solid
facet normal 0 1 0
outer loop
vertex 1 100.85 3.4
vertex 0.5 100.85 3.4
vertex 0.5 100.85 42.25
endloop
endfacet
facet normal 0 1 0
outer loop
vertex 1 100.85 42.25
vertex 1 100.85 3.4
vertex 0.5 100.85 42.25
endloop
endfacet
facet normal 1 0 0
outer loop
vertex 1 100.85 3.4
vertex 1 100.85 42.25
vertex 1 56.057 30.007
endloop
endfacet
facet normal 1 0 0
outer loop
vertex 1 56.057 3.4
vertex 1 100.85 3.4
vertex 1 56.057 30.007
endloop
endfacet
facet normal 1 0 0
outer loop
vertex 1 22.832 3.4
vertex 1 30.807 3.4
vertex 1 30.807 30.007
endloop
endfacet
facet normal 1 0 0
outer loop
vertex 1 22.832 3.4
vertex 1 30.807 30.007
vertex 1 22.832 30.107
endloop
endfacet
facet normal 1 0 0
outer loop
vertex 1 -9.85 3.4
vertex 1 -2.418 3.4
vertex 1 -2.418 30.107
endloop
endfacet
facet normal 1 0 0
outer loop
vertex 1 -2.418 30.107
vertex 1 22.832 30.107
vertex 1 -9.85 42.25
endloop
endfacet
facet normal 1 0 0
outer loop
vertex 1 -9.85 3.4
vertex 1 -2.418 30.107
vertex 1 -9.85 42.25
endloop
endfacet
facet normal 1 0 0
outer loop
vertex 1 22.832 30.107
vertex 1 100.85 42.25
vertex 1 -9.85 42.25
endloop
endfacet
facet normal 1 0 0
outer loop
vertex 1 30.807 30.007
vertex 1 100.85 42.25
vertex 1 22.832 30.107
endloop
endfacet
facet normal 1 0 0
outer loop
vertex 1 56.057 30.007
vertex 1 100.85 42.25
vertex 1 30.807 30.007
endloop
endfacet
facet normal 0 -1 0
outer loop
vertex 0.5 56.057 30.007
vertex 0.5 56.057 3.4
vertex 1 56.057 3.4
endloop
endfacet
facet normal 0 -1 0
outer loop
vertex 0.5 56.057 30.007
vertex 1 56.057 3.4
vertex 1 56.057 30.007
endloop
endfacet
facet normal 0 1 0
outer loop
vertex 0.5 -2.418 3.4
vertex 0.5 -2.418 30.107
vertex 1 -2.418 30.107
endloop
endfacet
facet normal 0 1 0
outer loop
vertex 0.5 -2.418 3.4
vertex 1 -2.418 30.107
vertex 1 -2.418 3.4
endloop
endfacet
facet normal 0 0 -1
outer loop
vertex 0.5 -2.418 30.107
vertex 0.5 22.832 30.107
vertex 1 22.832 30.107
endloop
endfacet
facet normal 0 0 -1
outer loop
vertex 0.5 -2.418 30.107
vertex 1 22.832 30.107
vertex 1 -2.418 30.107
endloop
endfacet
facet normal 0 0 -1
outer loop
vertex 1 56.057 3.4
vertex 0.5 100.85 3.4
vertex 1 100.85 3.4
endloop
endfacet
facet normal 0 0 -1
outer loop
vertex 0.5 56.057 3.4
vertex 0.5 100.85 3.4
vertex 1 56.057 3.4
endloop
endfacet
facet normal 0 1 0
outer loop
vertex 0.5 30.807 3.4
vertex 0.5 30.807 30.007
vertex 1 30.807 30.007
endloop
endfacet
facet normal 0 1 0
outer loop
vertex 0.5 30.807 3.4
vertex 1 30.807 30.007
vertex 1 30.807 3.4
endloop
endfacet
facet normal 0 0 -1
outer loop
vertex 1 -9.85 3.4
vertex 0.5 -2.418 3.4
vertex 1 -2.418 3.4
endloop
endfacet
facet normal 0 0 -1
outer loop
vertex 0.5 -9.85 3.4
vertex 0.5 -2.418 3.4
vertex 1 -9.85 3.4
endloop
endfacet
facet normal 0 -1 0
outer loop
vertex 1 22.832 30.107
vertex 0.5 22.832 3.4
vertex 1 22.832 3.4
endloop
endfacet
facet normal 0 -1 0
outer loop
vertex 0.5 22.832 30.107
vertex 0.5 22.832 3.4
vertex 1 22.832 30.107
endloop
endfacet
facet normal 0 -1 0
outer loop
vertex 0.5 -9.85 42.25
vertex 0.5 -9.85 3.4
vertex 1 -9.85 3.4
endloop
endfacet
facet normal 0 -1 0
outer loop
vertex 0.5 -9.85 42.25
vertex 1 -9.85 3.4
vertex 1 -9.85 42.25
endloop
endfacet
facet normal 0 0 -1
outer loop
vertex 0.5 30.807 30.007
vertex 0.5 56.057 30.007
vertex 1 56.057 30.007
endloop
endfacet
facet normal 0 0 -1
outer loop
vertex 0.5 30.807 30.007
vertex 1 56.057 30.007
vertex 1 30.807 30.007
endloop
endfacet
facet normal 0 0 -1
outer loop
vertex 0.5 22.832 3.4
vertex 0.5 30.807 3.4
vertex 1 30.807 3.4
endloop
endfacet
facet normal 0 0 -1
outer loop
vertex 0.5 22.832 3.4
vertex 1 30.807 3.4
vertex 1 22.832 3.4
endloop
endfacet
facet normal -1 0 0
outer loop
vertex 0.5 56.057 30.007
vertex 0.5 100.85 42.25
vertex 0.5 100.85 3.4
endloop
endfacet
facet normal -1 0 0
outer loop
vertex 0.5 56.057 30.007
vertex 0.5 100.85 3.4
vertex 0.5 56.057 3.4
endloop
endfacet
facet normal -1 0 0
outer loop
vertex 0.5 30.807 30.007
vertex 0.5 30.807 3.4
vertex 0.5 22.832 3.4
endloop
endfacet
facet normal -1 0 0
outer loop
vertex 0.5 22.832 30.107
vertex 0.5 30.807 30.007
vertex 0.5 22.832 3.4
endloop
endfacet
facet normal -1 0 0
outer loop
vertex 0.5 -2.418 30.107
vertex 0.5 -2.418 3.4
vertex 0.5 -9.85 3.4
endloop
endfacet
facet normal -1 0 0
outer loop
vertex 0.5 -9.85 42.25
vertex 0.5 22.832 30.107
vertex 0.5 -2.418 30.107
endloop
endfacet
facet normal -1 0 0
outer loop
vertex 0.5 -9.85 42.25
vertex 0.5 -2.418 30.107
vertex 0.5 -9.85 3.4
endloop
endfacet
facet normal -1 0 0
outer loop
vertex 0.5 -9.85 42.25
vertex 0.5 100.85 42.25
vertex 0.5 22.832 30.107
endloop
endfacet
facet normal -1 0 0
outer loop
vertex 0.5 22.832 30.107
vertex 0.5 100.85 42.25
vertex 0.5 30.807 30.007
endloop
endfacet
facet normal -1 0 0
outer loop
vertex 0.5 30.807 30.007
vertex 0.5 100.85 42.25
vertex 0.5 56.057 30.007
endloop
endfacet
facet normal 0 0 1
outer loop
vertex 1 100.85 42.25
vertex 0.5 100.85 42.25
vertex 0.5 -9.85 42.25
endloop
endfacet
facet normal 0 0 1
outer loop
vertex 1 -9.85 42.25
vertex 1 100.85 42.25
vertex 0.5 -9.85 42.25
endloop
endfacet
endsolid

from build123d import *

# Parameters (mm, degrees)
SKETCH_1_W          = 110.7
SKETCH_1_H          = 38.85
EXTRUDE_1_DEPTH     = 0.5
CUT_EXTRUDE_1_DEPTH = 110.343655509


with BuildPart() as part:
    # Эскиз1 → Бобышка-Вытянуть1 (new body)
    with BuildSketch(Plane(origin=(0.5, 0, 0), x_dir=(0, -1, 0), z_dir=(-1, 0, 0))):
        with Locations((-45.5, 22.825)):
            Rectangle(SKETCH_1_W, SKETCH_1_H)
    extrude(amount=-EXTRUDE_1_DEPTH)

    # Эскиз3 → Вырез-Вытянуть1 (cut, through all)
    with BuildSketch(Plane.ZY.offset(-0.5)):
        Polygon((30.006561442, 30.807083884), (-3.688047368, 30.807082411), (-3.688047368, 56.057082411), (30.006560338, 56.057083884), align=None)
        Polygon((30.106561442, -2.417922215), (-3.688047368, -2.417923692), (-3.688047368, 22.832076308), (30.106560338, 22.832077785), align=None)
    extrude(amount=-CUT_EXTRUDE_1_DEPTH, mode=Mode.SUBTRACT)


solid = part.part
